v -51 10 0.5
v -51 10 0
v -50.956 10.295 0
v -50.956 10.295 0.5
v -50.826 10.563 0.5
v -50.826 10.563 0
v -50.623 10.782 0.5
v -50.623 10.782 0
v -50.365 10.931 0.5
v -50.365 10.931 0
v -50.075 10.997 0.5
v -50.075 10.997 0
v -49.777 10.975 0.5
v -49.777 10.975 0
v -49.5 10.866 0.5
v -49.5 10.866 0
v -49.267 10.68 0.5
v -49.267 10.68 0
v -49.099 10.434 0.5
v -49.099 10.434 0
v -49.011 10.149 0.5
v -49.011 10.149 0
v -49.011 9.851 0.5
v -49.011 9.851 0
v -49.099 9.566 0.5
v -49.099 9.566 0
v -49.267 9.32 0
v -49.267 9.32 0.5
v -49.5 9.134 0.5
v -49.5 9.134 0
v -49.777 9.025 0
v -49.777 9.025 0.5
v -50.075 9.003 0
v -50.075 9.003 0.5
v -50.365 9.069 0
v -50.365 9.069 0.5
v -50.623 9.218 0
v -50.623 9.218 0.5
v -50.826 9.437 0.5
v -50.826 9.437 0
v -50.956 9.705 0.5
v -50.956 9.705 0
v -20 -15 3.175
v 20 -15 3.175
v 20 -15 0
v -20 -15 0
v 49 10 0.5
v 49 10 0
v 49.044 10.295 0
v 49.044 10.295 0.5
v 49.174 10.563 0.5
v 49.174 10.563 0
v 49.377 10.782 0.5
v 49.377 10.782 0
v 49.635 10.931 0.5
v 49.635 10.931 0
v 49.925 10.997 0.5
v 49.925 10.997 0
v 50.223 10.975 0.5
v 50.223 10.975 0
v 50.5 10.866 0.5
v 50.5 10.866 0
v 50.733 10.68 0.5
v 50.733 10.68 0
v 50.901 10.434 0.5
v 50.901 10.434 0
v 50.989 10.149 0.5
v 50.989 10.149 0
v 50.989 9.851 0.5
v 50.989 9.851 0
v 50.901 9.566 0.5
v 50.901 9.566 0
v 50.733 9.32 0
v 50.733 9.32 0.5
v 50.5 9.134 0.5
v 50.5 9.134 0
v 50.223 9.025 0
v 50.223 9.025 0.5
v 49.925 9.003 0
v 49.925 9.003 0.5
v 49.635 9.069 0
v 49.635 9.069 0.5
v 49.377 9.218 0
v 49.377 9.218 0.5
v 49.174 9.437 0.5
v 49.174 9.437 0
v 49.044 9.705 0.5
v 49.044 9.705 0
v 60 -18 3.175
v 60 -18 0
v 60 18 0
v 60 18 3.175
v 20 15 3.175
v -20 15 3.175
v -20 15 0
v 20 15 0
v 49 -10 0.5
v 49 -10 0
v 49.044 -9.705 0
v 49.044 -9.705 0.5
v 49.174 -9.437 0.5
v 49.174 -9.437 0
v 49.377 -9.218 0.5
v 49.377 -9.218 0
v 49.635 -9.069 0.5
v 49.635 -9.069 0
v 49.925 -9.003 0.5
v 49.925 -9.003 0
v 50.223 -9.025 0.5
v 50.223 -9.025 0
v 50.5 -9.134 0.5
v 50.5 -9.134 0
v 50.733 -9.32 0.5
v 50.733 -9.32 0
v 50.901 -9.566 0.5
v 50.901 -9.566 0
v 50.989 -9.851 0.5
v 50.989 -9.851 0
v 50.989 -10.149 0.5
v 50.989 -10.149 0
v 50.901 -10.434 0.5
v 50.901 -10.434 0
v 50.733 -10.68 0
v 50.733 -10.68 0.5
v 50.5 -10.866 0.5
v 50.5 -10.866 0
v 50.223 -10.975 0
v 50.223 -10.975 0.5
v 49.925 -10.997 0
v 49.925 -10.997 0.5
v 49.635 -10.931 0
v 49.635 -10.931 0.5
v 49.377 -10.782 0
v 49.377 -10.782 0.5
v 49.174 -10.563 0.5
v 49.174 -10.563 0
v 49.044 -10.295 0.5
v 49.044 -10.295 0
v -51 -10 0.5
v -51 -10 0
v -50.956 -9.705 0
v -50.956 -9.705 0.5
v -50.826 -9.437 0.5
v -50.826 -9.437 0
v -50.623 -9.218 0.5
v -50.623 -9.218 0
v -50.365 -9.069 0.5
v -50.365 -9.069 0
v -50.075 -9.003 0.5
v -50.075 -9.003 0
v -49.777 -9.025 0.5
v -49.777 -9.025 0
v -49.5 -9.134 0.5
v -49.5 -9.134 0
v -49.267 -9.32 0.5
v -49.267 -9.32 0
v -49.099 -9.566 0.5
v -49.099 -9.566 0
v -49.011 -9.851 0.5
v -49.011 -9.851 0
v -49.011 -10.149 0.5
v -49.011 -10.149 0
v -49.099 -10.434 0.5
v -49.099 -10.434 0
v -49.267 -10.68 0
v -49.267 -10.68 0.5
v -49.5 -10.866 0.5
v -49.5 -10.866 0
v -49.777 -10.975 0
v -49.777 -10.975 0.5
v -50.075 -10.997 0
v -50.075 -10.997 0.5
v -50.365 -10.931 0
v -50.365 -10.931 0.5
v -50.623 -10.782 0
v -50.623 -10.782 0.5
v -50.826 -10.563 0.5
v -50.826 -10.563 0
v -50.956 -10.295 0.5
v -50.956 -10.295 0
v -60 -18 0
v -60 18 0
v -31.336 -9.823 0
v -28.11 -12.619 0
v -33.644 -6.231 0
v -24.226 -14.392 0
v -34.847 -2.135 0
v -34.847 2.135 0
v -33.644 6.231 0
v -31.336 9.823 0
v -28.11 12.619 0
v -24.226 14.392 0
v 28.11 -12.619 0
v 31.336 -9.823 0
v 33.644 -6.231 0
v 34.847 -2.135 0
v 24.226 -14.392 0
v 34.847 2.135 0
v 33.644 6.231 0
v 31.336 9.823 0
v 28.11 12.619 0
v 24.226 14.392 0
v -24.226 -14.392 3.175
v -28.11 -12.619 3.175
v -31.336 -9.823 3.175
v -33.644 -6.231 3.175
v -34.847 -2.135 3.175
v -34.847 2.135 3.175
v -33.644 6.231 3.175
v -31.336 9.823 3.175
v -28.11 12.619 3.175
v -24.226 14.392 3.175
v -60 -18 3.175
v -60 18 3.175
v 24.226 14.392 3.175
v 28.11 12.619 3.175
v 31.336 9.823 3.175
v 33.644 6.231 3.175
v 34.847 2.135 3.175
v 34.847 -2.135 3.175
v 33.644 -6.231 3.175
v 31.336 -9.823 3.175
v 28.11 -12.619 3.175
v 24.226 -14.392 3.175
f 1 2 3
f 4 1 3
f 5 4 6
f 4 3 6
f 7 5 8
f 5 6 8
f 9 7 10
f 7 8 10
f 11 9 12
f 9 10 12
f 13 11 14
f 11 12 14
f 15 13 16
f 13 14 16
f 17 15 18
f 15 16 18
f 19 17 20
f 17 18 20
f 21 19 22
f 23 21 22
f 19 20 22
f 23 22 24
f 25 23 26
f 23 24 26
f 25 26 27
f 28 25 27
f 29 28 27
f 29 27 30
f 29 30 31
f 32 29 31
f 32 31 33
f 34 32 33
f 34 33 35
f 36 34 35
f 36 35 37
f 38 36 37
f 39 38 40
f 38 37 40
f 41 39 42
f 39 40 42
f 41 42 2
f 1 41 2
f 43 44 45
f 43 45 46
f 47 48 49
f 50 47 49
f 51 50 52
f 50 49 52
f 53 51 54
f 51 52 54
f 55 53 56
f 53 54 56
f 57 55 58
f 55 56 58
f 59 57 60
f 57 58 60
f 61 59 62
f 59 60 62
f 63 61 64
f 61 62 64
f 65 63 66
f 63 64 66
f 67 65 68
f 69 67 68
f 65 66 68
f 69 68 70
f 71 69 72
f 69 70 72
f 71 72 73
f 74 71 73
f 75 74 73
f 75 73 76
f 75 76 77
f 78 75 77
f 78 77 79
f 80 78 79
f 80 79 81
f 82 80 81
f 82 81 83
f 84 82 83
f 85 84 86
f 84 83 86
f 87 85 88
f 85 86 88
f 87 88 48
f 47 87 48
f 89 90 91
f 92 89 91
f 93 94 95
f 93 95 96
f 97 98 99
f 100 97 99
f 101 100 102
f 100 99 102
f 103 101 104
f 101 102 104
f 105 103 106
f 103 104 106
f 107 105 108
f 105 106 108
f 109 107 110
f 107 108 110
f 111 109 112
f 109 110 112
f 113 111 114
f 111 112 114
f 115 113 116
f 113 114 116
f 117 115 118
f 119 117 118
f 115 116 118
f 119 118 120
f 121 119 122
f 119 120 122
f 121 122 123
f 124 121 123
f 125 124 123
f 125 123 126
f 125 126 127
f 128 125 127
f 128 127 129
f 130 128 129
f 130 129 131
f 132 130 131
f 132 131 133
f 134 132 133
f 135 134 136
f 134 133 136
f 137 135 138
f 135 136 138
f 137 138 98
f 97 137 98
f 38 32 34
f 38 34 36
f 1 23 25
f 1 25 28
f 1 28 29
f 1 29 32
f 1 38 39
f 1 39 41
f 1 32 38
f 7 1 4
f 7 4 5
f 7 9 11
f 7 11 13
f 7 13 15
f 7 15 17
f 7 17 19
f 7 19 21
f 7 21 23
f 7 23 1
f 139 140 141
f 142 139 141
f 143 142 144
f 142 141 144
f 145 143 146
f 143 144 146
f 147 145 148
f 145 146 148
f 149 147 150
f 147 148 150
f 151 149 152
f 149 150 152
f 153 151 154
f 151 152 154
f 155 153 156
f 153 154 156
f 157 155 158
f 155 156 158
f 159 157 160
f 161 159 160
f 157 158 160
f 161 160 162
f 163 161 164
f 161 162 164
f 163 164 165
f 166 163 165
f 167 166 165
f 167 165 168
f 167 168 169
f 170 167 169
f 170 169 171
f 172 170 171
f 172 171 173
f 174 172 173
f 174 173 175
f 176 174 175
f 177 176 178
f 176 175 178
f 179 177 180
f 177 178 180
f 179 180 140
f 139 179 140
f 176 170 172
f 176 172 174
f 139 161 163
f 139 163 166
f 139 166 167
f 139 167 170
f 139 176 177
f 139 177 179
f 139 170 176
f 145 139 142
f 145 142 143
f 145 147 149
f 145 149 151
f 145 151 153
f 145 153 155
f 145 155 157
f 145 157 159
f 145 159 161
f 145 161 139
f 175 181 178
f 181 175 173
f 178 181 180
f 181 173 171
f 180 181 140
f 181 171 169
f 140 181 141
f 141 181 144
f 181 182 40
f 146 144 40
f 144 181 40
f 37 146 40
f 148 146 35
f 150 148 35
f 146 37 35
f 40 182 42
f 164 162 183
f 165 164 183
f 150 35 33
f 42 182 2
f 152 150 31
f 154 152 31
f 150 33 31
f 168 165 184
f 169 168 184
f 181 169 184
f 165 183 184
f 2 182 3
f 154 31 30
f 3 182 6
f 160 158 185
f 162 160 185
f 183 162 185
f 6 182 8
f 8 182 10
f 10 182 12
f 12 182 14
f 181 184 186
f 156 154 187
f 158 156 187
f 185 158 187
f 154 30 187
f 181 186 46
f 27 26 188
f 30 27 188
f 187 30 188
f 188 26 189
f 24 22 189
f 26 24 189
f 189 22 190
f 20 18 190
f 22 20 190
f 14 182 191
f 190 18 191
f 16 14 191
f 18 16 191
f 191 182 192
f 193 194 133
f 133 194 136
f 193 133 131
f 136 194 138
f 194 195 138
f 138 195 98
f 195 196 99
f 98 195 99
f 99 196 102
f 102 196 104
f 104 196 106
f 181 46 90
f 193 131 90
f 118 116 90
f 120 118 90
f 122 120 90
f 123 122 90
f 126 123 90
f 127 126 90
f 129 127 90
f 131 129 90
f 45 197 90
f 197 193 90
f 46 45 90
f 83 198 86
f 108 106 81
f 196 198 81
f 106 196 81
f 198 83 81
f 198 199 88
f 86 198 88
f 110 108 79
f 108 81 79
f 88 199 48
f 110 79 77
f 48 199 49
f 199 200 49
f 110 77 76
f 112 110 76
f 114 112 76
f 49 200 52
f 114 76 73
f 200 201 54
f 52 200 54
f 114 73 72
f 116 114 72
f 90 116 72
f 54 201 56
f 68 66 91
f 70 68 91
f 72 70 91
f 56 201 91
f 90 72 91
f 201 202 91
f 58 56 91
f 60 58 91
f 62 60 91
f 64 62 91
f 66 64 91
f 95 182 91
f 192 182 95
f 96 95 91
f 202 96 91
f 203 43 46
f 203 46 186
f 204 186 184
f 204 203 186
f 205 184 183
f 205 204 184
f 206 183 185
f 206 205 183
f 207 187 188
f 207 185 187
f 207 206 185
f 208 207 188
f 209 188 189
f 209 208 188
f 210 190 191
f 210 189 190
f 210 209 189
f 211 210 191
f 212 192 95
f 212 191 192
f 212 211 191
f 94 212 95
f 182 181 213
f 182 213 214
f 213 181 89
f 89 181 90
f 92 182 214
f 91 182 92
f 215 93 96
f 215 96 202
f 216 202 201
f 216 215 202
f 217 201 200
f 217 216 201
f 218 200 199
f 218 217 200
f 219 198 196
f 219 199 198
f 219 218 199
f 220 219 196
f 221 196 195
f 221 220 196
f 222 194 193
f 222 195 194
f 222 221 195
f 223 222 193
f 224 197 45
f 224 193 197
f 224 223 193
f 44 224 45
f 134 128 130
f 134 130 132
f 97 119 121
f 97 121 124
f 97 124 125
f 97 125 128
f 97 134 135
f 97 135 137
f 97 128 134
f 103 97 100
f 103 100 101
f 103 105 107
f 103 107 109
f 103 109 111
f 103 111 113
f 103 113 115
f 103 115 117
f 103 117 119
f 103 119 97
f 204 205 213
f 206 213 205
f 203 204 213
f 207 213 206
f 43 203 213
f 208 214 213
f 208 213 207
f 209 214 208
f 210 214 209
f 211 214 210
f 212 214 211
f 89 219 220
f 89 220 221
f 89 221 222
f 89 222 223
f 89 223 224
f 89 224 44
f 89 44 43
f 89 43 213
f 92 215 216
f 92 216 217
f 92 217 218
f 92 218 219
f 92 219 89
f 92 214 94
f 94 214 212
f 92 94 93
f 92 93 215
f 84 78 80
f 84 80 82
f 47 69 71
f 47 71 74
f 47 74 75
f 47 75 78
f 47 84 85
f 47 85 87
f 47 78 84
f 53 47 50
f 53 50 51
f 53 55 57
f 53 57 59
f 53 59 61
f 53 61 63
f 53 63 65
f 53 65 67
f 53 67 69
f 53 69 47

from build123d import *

# Parameters (mm, degrees)
SKETCH1_W           = 120
SKETCH1_H           = 36
BOSS_EXTRUDE1_DEPTH = 3.175
CUT_EXTRUDE1_DEPTH  = 63.72224984
SKETCH5_R           = 1
CUT_EXTRUDE2_DEPTH  = 0.5


with BuildPart() as part:
    # Sketch1 → Boss-Extrude1 (new body)
    with BuildSketch(Plane.XY):
        Rectangle(SKETCH1_W, SKETCH1_H)
    extrude(amount=BOSS_EXTRUDE1_DEPTH)

    # Sketch2 → Cut-Extrude1 (cut, through all)
    with BuildSketch(Plane.XY.offset(3.175)):
        with BuildLine():
            Line((20, -15), (-20, -15))
            ThreePointArc((-20, -15), (-35, 0), (-20, 15))
            Line((-20, 15), (20, 15))
            ThreePointArc((20, 15), (35, 0), (20, -15))
        make_face()
    extrude(amount=-CUT_EXTRUDE1_DEPTH, mode=Mode.SUBTRACT)

    # Sketch5 → Cut-Extrude2 (cut)
    with BuildSketch(Plane(origin=(0, 0, 0), x_dir=(-1, 0, 0), z_dir=(0, 0, -1))):
        with Locations((-50, 10)):
            Circle(SKETCH5_R)
        with Locations((-50, -10)):
            Circle(SKETCH5_R)
        with Locations((50, -10)):
            Circle(SKETCH5_R)
        with Locations((50, 10)):
            Circle(SKETCH5_R)
    extrude(amount=-CUT_EXTRUDE2_DEPTH, mode=Mode.SUBTRACT)


solid = part.part
